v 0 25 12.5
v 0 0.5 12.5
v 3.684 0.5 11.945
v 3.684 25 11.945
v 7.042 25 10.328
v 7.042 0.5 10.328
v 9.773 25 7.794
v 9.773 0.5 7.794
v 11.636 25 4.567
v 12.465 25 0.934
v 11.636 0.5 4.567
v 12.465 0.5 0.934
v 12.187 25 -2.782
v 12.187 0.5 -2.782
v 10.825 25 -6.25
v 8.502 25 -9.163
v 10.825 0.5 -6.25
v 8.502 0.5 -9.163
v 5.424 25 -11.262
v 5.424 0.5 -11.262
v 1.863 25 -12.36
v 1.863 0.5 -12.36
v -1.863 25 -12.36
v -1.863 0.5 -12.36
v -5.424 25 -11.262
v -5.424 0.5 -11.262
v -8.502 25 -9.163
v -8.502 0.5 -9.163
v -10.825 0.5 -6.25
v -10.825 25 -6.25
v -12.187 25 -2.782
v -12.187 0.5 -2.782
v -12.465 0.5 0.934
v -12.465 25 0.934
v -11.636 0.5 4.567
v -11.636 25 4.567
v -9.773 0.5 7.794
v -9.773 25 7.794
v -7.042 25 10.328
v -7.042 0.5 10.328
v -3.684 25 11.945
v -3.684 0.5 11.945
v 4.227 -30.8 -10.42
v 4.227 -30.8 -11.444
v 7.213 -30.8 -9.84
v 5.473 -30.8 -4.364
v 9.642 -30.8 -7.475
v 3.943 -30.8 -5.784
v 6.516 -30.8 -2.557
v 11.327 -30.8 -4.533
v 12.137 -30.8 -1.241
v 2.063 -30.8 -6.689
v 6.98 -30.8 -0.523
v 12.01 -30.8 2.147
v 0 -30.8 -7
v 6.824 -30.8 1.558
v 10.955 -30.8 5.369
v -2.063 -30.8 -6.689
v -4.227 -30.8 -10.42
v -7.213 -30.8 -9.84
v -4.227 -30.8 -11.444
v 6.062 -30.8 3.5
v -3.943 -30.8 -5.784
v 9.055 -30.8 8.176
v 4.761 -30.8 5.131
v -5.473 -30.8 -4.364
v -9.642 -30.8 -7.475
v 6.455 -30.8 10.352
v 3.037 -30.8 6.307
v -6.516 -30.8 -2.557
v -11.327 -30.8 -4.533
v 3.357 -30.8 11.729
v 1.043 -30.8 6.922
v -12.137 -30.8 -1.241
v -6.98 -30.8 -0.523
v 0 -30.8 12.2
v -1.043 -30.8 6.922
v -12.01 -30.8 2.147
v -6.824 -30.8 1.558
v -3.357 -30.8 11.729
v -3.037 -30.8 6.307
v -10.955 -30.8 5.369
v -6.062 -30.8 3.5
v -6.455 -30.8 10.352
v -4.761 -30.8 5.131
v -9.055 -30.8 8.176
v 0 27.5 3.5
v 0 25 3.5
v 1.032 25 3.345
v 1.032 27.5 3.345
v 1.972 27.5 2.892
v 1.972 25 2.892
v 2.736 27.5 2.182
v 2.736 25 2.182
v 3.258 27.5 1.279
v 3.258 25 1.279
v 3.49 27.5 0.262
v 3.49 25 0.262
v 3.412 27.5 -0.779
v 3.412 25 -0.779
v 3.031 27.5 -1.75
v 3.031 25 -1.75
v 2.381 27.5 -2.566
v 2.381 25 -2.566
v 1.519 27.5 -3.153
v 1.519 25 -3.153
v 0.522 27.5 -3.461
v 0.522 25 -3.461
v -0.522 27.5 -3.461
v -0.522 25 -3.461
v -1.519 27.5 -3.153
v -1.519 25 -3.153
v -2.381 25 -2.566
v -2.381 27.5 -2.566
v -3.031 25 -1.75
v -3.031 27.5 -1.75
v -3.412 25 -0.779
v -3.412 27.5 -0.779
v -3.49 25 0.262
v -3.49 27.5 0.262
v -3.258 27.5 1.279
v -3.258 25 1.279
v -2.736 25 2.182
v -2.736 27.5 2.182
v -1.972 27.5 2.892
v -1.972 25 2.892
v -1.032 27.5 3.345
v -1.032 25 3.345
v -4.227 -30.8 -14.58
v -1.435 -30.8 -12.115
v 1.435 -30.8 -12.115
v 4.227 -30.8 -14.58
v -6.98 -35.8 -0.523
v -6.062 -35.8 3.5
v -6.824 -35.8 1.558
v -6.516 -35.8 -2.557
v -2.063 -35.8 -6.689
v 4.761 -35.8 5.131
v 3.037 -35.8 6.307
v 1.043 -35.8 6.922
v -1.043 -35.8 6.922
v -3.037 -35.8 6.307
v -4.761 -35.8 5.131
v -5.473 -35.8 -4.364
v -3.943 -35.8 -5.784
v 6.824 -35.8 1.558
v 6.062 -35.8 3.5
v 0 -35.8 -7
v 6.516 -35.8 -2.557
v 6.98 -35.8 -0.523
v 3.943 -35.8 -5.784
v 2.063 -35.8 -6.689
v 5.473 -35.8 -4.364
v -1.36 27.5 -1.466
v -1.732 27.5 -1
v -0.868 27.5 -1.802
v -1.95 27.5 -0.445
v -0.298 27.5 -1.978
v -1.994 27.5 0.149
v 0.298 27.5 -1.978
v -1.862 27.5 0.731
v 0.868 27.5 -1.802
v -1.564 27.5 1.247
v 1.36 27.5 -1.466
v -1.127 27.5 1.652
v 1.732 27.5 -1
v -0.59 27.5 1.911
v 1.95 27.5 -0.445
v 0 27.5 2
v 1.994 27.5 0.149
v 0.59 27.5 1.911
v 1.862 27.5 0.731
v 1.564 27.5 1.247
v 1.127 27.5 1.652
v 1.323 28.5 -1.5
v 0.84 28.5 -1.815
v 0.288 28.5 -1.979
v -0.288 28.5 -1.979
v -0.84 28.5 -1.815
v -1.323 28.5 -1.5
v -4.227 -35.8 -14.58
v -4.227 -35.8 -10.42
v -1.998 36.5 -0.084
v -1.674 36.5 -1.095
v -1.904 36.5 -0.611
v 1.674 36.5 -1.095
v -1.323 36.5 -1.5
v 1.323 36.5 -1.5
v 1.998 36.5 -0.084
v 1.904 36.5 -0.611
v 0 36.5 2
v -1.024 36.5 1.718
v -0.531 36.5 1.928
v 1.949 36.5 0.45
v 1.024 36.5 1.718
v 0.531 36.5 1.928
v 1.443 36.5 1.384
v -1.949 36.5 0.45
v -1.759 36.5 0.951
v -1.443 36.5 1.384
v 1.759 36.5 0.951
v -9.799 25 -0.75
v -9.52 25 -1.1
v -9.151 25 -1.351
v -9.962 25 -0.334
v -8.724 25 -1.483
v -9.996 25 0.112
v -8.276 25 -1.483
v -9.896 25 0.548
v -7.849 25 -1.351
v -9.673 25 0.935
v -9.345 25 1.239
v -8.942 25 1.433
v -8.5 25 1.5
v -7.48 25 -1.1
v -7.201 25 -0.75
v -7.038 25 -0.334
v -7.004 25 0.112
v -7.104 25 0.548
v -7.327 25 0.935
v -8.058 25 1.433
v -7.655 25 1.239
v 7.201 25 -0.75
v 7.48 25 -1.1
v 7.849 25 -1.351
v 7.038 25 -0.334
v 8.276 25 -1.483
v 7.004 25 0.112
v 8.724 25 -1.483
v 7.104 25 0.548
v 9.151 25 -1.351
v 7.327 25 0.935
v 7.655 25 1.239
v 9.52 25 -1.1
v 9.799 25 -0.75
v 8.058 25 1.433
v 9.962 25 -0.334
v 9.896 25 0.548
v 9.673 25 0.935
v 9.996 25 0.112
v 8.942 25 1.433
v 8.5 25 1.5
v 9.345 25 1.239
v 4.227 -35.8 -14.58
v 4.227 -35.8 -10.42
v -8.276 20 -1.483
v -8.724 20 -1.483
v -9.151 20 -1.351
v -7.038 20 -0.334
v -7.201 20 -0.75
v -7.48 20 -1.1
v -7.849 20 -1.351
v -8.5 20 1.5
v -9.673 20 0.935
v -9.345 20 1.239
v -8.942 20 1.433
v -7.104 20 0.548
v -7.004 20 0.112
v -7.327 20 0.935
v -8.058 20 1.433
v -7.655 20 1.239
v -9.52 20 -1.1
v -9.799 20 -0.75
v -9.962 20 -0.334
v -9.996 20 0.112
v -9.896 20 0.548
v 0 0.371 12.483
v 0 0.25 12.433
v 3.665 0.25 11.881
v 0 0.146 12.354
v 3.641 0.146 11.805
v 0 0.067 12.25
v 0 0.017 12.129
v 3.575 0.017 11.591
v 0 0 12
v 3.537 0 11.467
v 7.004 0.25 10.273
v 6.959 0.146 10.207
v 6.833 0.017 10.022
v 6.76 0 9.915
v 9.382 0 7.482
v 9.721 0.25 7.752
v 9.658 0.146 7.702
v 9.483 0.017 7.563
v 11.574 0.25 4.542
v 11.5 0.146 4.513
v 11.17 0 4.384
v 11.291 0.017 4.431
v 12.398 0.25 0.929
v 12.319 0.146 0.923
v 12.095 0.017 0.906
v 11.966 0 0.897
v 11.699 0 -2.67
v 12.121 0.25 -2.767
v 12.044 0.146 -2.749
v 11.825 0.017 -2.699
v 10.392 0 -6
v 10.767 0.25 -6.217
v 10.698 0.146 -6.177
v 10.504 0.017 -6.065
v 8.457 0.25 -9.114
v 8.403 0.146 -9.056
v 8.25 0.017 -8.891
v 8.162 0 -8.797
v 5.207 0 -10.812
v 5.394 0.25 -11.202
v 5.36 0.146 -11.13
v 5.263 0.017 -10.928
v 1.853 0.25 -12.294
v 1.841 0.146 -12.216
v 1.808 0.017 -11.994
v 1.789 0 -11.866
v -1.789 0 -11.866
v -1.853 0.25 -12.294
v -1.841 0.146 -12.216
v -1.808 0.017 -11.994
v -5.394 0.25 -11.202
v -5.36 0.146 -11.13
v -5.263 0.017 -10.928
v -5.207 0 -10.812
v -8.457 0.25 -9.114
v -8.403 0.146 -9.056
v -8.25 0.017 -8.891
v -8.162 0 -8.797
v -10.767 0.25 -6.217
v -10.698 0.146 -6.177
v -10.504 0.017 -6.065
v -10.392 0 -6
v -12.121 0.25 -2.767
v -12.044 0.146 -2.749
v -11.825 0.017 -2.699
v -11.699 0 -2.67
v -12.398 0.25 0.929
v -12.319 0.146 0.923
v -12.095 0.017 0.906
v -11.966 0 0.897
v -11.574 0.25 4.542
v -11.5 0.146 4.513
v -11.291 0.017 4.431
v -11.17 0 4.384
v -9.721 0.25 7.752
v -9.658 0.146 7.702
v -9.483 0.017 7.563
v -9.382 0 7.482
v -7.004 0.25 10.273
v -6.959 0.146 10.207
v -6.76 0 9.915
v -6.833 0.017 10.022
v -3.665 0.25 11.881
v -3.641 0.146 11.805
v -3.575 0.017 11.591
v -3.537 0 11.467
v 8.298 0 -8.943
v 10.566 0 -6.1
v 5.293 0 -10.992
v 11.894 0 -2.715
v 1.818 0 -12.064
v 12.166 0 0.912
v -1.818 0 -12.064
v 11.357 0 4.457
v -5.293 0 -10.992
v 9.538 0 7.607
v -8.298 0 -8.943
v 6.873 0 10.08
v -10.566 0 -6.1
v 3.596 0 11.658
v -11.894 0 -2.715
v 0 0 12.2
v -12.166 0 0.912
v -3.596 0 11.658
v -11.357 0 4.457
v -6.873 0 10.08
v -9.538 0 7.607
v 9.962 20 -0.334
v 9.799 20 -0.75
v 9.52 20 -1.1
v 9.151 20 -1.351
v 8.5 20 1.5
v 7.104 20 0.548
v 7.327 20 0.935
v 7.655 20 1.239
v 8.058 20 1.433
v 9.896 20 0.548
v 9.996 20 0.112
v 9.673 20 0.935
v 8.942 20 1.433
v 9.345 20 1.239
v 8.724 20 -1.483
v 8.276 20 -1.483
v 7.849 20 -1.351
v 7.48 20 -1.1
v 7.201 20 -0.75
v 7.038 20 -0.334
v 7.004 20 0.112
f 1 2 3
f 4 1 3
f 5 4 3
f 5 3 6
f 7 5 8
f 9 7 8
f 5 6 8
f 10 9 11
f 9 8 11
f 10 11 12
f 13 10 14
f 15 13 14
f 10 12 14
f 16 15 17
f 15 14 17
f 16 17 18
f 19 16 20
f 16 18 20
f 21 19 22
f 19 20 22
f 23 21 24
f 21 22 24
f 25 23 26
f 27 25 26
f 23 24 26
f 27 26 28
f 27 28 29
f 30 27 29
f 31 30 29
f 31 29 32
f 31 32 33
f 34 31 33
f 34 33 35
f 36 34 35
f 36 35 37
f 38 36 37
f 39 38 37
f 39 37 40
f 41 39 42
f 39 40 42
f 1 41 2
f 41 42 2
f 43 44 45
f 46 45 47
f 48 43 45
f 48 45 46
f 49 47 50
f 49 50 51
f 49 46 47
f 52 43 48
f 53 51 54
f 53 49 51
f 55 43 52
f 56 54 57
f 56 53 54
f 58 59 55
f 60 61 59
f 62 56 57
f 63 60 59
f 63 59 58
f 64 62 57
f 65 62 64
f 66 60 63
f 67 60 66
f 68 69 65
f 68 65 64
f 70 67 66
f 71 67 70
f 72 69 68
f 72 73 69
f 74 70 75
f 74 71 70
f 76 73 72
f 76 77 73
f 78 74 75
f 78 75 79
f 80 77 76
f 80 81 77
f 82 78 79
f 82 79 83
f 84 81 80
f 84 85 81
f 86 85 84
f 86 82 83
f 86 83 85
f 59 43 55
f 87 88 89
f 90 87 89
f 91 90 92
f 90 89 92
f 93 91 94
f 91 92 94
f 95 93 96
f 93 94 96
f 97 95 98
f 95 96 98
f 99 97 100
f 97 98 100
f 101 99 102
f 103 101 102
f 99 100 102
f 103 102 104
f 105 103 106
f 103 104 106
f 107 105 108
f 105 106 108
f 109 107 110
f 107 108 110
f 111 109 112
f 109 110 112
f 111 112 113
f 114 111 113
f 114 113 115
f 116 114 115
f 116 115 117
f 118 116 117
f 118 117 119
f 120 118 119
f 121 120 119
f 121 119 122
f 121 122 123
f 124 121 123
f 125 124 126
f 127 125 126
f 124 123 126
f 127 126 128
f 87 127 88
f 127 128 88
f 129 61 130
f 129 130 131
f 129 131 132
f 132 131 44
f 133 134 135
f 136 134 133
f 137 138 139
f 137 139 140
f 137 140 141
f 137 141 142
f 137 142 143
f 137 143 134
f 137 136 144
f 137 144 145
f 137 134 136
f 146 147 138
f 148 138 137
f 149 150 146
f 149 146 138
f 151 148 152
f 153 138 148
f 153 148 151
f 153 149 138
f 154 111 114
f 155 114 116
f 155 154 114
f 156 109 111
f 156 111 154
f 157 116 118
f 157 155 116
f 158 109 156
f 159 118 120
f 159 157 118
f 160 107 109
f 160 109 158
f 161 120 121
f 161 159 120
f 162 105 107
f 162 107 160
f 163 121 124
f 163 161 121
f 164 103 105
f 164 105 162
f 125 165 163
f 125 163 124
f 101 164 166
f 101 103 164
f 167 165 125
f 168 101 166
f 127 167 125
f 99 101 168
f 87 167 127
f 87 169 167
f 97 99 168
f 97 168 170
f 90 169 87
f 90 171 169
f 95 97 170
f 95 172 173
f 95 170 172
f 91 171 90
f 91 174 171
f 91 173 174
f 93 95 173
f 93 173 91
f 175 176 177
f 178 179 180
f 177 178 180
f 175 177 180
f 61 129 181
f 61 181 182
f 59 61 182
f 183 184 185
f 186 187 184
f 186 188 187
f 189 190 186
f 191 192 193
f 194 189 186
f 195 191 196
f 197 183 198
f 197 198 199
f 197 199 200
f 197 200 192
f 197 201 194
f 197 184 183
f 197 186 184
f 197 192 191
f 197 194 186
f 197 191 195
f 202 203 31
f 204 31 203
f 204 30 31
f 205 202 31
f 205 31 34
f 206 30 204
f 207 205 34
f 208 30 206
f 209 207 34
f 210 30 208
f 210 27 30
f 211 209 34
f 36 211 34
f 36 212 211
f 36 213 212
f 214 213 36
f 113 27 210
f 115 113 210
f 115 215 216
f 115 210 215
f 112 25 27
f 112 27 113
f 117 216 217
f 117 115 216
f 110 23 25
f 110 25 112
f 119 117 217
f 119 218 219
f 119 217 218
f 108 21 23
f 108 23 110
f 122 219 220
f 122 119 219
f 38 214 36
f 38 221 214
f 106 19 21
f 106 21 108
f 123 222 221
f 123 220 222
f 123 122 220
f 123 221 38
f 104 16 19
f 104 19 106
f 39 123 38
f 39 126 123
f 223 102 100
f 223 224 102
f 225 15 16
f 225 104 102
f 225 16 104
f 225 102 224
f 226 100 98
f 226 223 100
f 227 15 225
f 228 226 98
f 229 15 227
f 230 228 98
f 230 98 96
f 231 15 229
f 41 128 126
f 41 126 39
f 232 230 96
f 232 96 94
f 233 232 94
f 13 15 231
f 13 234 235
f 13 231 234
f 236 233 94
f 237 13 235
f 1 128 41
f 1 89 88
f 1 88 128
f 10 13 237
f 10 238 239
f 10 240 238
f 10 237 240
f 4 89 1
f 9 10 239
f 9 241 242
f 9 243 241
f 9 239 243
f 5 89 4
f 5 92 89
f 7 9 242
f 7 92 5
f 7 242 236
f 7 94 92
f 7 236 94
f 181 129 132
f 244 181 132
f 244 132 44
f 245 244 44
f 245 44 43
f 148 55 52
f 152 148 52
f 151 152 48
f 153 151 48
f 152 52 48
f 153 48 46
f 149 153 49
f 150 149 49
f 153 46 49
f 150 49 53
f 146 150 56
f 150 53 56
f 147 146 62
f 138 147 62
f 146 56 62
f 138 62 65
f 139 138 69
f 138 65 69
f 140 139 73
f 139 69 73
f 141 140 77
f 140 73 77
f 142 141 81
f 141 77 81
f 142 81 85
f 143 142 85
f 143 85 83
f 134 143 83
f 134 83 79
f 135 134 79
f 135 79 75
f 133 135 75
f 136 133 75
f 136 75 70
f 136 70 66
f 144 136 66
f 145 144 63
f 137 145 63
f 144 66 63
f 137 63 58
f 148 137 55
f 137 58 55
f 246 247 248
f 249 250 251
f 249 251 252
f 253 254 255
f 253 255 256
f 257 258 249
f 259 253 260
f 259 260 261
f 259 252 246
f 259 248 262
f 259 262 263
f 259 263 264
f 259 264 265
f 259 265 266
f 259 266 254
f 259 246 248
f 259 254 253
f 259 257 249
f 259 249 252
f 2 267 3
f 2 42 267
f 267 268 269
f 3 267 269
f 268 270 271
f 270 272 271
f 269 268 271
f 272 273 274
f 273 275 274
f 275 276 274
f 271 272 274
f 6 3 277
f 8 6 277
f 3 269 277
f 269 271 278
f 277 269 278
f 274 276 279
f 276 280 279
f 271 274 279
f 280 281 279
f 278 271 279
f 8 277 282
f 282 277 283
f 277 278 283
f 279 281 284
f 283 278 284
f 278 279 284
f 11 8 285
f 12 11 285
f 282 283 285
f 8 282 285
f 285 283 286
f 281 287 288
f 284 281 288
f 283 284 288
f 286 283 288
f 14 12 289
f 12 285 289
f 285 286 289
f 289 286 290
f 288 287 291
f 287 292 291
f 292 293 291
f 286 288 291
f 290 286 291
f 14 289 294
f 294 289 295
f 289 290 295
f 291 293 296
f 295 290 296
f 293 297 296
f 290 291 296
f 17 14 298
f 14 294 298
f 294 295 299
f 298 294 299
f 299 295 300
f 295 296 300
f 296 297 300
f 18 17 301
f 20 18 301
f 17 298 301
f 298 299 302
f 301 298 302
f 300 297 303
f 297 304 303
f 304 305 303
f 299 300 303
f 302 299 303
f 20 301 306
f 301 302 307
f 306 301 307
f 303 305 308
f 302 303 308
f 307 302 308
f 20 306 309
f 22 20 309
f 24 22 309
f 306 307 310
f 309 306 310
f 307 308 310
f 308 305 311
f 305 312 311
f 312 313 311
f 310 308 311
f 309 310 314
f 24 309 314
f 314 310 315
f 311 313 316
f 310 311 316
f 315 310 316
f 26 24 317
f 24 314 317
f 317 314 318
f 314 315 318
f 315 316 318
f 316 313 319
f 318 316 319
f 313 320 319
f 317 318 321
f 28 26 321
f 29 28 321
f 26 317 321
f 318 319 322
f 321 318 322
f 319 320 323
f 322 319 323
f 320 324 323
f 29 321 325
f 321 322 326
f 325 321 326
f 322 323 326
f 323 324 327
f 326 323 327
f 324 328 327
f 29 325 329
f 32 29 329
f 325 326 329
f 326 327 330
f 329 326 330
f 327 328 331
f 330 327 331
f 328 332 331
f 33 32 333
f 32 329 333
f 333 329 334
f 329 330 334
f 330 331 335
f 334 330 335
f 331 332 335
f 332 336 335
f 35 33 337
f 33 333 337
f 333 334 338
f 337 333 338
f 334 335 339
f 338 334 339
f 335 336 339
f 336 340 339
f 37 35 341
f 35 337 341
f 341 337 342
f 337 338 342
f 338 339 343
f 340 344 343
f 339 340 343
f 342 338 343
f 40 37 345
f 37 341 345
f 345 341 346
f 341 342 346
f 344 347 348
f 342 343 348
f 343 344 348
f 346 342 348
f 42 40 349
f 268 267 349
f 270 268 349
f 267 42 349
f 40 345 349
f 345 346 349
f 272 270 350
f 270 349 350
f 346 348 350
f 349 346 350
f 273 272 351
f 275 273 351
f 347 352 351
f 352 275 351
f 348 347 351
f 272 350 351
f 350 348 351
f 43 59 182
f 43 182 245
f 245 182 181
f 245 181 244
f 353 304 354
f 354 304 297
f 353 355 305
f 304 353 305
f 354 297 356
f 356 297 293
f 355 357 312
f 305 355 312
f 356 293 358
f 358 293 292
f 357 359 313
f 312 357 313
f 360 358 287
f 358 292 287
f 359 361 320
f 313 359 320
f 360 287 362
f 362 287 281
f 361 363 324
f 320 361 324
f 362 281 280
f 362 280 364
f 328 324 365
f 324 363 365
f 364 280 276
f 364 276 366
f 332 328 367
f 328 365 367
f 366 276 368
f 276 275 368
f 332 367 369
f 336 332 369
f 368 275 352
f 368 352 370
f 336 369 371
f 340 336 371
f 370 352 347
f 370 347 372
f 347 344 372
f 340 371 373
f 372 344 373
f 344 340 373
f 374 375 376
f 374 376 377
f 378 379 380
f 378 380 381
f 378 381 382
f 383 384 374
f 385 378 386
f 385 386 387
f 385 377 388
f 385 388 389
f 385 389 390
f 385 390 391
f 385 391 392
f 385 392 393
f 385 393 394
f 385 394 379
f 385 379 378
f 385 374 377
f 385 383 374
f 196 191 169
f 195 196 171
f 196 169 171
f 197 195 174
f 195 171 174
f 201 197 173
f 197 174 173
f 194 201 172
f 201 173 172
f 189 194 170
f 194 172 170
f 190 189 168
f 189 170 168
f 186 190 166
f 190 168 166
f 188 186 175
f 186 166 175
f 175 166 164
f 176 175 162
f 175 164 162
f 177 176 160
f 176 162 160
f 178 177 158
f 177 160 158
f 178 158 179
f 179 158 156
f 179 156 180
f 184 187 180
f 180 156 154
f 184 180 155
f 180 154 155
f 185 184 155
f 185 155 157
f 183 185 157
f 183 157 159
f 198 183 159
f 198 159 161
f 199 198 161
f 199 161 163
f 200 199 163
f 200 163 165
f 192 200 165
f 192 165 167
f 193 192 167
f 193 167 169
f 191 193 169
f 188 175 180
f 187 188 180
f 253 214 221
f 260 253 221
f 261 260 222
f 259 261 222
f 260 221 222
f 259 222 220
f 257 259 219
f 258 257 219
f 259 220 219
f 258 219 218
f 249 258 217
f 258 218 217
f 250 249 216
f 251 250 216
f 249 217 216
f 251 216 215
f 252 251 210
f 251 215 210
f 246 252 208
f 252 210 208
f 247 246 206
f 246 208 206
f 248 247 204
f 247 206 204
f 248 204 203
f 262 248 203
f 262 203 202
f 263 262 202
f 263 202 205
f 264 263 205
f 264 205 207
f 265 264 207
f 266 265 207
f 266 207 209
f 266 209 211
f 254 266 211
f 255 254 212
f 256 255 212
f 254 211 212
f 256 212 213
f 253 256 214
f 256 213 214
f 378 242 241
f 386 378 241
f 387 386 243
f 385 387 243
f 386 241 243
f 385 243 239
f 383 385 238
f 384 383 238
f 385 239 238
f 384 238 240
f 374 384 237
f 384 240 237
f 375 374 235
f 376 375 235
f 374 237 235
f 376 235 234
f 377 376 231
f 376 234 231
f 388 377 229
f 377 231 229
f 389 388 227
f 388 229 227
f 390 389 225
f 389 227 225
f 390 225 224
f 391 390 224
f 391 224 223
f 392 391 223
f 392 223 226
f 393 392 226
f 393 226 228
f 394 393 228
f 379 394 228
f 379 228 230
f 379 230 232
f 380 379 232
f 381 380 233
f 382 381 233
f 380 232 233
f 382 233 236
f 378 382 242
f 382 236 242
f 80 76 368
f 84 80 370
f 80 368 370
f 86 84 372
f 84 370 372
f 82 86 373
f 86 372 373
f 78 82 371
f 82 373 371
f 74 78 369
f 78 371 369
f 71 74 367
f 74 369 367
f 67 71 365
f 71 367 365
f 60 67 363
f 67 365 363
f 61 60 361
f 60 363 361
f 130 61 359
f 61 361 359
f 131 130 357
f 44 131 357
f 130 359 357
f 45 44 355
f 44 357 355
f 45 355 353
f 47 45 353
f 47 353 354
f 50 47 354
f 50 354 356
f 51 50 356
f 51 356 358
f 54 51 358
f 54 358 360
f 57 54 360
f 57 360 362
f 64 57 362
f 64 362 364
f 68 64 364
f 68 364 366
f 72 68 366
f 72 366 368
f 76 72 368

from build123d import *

# Parameters (mm, degrees)
SKETCH1_R           = 12.5
BOSS_EXTRUDE1_DEPTH = 25
FILLET1_R           = 0.5
SKETCH3_R           = 12.2
BOSS_EXTRUDE2_DEPTH = 30.8
SKETCH4_R           = 3.5
BOSS_EXTRUDE3_DEPTH = 2.5
SKETCH5_R           = 2
BOSS_EXTRUDE4_DEPTH = 9
CUT_EXTRUDE1_START  = -8
CUT_EXTRUDE1_DEPTH  = 8
SKETCH7_R           = 1.5
CUT_EXTRUDE2_DEPTH  = 5
SKETCH8_R           = 7
SKETCH8_W           = 8.453145494
SKETCH8_H           = 4.159745146
BOSS_EXTRUDE5_DEPTH = 5


with BuildPart() as part:
    # Sketch1 → Boss-Extrude1 (new body)
    with BuildSketch(Plane(origin=(0, 0, 0), x_dir=(1, 0, 0), z_dir=(0, 1, 0))):
        with Locations(Location((0, 0, 0), (0, 0, 270))):
            Circle(SKETCH1_R)
    extrude(amount=BOSS_EXTRUDE1_DEPTH)

    # Fillet1
    fillet1_edges = [part.edges().sort_by_distance(p)[0] for p in [
        (0, 0, -12.5),
    ]]
    fillet(fillet1_edges, radius=FILLET1_R)

    # Sketch3 → Boss-Extrude2 (add)
    with BuildSketch(Plane.XZ):
        with Locations(Location((0, 0, 0), (0, 0, 90))):
            Circle(SKETCH3_R)
    extrude(amount=BOSS_EXTRUDE2_DEPTH)

    # Sketch4 → Boss-Extrude3 (add)
    with BuildSketch(Plane(origin=(0, 25, 0), x_dir=(1, 0, 0), z_dir=(0, 1, 0))):
        with Locations(Location((0, 0, 0), (0, 0, 270))):
            Circle(SKETCH4_R)
    extrude(amount=BOSS_EXTRUDE3_DEPTH)

    # Sketch5 → Boss-Extrude4 (add)
    with BuildSketch(Plane(origin=(0, 27.5, 0), x_dir=(1, 0, 0), z_dir=(0, 1, 0))):
        with Locations(Location((0, 0, 0), (0, 0, 270))):
            Circle(SKETCH5_R)
    extrude(amount=BOSS_EXTRUDE4_DEPTH)

    # Sketch6 → Cut-Extrude1 (cut)
    with BuildSketch(Plane(origin=(0, 36.5, 0), x_dir=(1, 0, 0), z_dir=(0, 1, 0)).offset(CUT_EXTRUDE1_START)):
        with BuildLine():
            Line((1.322875656, 1.5), (-1.322875656, 1.5))
            ThreePointArc((-1.322875656, 1.5), (0, 2), (1.322875656, 1.5))
        make_face()
    extrude(amount=CUT_EXTRUDE1_DEPTH, mode=Mode.SUBTRACT)

    # Sketch7 → Cut-Extrude2 (cut)
    with BuildSketch(Plane(origin=(0, 25, 0), x_dir=(1, 0, 0), z_dir=(0, 1, 0))):
        with Locations(Location((-8.5, 0, 0), (0, 0, 270))):
            Circle(SKETCH7_R)
        with Locations(Location((8.5, 0, 0), (0, 0, 270))):
            Circle(SKETCH7_R)
    extrude(amount=-CUT_EXTRUDE2_DEPTH, mode=Mode.SUBTRACT)

    # Sketch8 → Boss-Extrude5 (add)
    with BuildSketch(Plane.XZ.offset(30.8)):
        with Locations(Location((0, 0, 0), (0, 0, 270))):
            Circle(SKETCH8_R)
        with Locations((0, -12.5)):
            Rectangle(SKETCH8_W, SKETCH8_H)
    extrude(amount=BOSS_EXTRUDE5_DEPTH)


solid = part.part
